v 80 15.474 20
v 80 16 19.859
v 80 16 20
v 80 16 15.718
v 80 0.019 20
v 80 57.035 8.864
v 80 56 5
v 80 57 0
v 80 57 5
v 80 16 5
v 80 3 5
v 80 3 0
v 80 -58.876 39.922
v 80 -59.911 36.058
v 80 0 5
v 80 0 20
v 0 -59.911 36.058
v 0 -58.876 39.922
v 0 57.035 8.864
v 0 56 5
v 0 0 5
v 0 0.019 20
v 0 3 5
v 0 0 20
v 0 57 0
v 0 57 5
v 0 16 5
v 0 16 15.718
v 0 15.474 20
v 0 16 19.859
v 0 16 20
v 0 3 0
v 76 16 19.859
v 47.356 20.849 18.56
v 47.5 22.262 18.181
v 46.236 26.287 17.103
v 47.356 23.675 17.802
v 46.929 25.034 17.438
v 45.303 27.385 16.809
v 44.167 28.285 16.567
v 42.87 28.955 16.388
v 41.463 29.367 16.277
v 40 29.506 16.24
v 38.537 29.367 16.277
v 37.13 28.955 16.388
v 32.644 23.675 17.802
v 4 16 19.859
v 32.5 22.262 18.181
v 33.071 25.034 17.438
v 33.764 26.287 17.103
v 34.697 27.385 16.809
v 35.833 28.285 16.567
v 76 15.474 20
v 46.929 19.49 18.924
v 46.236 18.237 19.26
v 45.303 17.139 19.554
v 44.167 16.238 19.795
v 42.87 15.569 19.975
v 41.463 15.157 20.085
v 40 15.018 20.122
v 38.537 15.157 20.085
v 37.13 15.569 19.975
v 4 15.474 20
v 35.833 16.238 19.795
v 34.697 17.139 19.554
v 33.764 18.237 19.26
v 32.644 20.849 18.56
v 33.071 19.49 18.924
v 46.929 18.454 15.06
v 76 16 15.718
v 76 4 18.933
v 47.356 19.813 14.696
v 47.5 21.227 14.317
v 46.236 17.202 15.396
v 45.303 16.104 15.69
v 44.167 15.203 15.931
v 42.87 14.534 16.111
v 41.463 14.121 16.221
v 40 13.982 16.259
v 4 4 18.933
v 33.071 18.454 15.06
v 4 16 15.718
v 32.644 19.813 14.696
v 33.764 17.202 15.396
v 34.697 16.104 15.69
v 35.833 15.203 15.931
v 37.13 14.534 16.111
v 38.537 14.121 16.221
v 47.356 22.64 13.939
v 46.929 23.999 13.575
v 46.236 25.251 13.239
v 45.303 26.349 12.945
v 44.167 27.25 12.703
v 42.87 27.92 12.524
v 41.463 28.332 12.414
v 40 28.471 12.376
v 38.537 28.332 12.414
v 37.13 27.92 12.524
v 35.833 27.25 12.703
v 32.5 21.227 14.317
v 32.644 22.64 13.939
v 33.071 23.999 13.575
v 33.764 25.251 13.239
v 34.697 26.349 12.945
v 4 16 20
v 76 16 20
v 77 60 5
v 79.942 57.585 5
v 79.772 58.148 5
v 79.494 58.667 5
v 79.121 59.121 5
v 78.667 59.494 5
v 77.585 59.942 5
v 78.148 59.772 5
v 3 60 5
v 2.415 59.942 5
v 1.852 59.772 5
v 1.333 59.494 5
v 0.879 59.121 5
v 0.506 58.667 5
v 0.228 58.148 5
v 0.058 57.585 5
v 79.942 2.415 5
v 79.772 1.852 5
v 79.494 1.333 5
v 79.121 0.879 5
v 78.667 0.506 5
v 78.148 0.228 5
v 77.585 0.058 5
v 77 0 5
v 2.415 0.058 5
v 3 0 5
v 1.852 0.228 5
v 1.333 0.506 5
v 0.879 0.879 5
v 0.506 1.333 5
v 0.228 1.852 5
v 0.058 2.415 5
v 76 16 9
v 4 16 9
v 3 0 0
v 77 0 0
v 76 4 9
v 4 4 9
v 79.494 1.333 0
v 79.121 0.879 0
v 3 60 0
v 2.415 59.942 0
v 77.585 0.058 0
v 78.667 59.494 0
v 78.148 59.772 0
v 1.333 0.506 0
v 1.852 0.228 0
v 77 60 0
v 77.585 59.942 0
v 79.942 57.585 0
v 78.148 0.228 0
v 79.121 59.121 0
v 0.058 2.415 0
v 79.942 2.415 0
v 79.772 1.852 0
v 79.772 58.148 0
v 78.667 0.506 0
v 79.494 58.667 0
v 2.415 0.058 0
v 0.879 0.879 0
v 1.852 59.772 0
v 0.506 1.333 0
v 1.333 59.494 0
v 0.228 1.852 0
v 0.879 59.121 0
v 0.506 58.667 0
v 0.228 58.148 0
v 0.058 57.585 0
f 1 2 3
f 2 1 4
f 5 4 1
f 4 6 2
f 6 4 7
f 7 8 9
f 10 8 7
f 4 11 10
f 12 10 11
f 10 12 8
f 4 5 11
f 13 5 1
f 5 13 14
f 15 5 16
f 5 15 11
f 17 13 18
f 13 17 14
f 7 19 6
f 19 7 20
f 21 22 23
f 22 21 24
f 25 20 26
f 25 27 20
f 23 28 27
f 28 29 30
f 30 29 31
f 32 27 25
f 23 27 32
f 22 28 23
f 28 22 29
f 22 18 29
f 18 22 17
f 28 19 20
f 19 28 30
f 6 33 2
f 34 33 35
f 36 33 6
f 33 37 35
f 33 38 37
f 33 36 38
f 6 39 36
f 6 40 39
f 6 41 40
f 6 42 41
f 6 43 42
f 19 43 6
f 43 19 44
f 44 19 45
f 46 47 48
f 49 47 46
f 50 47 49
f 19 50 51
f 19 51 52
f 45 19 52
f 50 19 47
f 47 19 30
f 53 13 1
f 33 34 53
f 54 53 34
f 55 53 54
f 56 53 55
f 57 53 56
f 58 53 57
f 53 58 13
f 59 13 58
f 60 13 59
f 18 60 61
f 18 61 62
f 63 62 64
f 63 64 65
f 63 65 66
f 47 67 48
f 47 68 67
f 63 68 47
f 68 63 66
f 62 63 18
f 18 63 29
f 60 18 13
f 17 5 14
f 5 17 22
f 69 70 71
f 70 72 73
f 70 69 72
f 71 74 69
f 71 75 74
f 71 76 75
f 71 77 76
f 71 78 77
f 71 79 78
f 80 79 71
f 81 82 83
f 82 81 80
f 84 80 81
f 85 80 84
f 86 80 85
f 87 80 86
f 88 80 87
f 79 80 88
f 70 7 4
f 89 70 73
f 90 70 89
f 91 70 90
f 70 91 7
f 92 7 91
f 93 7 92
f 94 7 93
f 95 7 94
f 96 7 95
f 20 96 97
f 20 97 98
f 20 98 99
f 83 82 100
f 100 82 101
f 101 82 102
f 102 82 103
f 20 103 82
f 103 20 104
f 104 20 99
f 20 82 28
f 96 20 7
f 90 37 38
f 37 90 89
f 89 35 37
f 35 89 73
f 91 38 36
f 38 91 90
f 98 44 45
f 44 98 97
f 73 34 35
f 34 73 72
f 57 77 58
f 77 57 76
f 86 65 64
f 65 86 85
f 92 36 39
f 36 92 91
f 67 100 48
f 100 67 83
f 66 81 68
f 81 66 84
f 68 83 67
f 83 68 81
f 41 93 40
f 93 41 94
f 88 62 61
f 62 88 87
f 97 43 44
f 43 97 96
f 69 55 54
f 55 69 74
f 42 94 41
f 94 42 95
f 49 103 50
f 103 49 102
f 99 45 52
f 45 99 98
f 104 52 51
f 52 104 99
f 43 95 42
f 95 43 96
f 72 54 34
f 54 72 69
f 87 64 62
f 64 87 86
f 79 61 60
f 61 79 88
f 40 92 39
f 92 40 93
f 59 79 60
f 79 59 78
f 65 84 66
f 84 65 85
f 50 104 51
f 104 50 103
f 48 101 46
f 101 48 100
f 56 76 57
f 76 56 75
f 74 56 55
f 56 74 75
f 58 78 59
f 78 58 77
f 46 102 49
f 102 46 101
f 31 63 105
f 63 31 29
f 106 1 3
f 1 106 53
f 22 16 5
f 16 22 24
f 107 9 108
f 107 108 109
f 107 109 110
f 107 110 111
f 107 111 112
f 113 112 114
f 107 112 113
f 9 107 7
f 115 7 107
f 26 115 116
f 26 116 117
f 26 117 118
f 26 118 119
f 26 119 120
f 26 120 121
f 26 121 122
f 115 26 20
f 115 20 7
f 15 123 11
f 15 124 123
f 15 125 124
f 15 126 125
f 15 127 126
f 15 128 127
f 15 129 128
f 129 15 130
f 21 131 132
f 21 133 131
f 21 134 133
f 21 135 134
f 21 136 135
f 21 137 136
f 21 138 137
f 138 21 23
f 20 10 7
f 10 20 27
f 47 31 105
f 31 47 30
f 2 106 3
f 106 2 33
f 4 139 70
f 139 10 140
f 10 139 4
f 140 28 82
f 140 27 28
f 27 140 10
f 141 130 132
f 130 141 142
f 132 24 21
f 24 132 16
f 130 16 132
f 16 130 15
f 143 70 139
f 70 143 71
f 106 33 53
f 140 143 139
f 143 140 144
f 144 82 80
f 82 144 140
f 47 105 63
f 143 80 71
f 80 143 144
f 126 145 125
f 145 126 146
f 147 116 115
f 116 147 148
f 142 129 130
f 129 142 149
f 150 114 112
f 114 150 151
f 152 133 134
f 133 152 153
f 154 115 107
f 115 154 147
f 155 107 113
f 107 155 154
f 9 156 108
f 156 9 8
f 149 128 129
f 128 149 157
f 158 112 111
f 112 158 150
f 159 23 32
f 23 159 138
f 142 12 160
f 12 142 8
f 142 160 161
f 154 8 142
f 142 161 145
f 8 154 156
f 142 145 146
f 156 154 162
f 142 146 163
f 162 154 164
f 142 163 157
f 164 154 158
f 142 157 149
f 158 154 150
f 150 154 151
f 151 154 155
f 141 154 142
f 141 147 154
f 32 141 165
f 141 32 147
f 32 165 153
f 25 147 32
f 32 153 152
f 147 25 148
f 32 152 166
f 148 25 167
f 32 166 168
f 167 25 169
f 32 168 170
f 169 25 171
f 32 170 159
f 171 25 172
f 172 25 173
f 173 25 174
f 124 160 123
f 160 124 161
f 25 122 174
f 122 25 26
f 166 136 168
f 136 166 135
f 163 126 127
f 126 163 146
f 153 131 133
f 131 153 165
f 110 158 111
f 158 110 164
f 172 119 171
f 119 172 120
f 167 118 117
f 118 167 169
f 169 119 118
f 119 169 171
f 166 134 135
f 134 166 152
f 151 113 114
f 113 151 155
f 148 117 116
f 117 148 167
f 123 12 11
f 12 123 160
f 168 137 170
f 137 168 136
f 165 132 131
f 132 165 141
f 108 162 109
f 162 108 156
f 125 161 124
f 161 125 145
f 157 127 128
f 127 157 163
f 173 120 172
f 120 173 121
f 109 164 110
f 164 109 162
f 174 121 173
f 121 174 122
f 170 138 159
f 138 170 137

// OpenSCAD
// Parametric Phone Stand
// A customizable stand for phones and tablets
// License: CC0 (Public Domain)

/* [Dimensions] */
// Width of the stand (should fit your phone)
width = 80; // [50:200]

// Depth of the base
base_depth = 60; // [30:100]

// Height of the back support
back_height = 120; // [60:200]

// Phone/tablet thickness (add 1-2mm margin)
device_thickness = 12; // [5:25]

/* [Angle] */
// Viewing angle (degrees from vertical)
tilt_angle = 15; // [0:45]

/* [Style] */
// Stand style
style = "solid"; // [solid, openwork, minimal]

// Edge rounding
corner_radius = 3; // [0:10]

/* [Charging] */
// Add cable hole for charging
cable_hole = "yes"; // [yes, no]

// Cable hole diameter
cable_diameter = 15; // [8:25]

/* [Quality] */
// Render quality
$fn = 32; // [16:64]

/* [Hidden] */
back_angle = 90 - tilt_angle;
base_thickness = 5;
wall_thickness = 4;
lip_height = 15;

module phone_stand() {
    union() {
        // Base plate
        base_plate();
        
        // Back support
        back_support();
        
        // Front lip to hold phone
        front_lip();
    }
}

module base_plate() {
    if (style == "openwork") {
        difference() {
            rounded_cube(width, base_depth, base_thickness, corner_radius);
            // Cut out center
            translate([wall_thickness*2, wall_thickness*2, -0.1])
                rounded_cube(width - wall_thickness*4, base_depth - wall_thickness*4, base_thickness + 0.2, corner_radius);
        }
    } else if (style == "minimal") {
        // Just front and back rails
        rounded_cube(width, wall_thickness*2, base_thickness, corner_radius);
        translate([0, base_depth - wall_thickness*2, 0])
            rounded_cube(width, wall_thickness*2, base_thickness, corner_radius);
    } else {
        rounded_cube(width, base_depth, base_thickness, corner_radius);
    }
    
    // Cable hole
    if (cable_hole == "yes") {
        translate([width/2, base_depth - wall_thickness, -0.1]) {
            // Slot for cable access
        }
    }
}

module back_support() {
    translate([0, base_depth - wall_thickness, base_thickness]) {
        rotate([back_angle, 0, 0]) {
            difference() {
                union() {
                    // Main back
                    if (style == "openwork") {
                        // Frame only
                        cube([wall_thickness, wall_thickness, back_height]);
                        translate([width - wall_thickness, 0, 0])
                            cube([wall_thickness, wall_thickness, back_height]);
                        translate([0, 0, back_height - wall_thickness])
                            cube([width, wall_thickness, wall_thickness]);
                    } else if (style == "minimal") {
                        // Two posts
                        cube([wall_thickness*2, wall_thickness, back_height]);
                        translate([width - wall_thickness*2, 0, 0])
                            cube([wall_thickness*2, wall_thickness, back_height]);
                    } else {
                        cube([width, wall_thickness, back_height]);
                    }
                }
                
                // Cable hole
                if (cable_hole == "yes" && style == "solid") {
                    translate([width/2, -0.1, back_height * 0.3])
                        rotate([-90, 0, 0])
                        cylinder(d=cable_diameter, h=wall_thickness + 0.2);
                }
            }
        }
    }
}

module front_lip() {
    translate([0, 0, base_thickness]) {
        difference() {
            // Outer lip
            cube([width, device_thickness + wall_thickness, lip_height]);
            
            // Inner cutout for device
            translate([wall_thickness, wall_thickness, wall_thickness])
                cube([width - wall_thickness*2, device_thickness, lip_height]);
        }
    }
}

module rounded_cube(w, d, h, r) {
    if (r <= 0) {
        cube([w, d, h]);
    } else {
        hull() {
            translate([r, r, 0]) cylinder(r=r, h=h);
            translate([w-r, r, 0]) cylinder(r=r, h=h);
            translate([r, d-r, 0]) cylinder(r=r, h=h);
            translate([w-r, d-r, 0]) cylinder(r=r, h=h);
        }
    }
}

// Render
phone_stand();
